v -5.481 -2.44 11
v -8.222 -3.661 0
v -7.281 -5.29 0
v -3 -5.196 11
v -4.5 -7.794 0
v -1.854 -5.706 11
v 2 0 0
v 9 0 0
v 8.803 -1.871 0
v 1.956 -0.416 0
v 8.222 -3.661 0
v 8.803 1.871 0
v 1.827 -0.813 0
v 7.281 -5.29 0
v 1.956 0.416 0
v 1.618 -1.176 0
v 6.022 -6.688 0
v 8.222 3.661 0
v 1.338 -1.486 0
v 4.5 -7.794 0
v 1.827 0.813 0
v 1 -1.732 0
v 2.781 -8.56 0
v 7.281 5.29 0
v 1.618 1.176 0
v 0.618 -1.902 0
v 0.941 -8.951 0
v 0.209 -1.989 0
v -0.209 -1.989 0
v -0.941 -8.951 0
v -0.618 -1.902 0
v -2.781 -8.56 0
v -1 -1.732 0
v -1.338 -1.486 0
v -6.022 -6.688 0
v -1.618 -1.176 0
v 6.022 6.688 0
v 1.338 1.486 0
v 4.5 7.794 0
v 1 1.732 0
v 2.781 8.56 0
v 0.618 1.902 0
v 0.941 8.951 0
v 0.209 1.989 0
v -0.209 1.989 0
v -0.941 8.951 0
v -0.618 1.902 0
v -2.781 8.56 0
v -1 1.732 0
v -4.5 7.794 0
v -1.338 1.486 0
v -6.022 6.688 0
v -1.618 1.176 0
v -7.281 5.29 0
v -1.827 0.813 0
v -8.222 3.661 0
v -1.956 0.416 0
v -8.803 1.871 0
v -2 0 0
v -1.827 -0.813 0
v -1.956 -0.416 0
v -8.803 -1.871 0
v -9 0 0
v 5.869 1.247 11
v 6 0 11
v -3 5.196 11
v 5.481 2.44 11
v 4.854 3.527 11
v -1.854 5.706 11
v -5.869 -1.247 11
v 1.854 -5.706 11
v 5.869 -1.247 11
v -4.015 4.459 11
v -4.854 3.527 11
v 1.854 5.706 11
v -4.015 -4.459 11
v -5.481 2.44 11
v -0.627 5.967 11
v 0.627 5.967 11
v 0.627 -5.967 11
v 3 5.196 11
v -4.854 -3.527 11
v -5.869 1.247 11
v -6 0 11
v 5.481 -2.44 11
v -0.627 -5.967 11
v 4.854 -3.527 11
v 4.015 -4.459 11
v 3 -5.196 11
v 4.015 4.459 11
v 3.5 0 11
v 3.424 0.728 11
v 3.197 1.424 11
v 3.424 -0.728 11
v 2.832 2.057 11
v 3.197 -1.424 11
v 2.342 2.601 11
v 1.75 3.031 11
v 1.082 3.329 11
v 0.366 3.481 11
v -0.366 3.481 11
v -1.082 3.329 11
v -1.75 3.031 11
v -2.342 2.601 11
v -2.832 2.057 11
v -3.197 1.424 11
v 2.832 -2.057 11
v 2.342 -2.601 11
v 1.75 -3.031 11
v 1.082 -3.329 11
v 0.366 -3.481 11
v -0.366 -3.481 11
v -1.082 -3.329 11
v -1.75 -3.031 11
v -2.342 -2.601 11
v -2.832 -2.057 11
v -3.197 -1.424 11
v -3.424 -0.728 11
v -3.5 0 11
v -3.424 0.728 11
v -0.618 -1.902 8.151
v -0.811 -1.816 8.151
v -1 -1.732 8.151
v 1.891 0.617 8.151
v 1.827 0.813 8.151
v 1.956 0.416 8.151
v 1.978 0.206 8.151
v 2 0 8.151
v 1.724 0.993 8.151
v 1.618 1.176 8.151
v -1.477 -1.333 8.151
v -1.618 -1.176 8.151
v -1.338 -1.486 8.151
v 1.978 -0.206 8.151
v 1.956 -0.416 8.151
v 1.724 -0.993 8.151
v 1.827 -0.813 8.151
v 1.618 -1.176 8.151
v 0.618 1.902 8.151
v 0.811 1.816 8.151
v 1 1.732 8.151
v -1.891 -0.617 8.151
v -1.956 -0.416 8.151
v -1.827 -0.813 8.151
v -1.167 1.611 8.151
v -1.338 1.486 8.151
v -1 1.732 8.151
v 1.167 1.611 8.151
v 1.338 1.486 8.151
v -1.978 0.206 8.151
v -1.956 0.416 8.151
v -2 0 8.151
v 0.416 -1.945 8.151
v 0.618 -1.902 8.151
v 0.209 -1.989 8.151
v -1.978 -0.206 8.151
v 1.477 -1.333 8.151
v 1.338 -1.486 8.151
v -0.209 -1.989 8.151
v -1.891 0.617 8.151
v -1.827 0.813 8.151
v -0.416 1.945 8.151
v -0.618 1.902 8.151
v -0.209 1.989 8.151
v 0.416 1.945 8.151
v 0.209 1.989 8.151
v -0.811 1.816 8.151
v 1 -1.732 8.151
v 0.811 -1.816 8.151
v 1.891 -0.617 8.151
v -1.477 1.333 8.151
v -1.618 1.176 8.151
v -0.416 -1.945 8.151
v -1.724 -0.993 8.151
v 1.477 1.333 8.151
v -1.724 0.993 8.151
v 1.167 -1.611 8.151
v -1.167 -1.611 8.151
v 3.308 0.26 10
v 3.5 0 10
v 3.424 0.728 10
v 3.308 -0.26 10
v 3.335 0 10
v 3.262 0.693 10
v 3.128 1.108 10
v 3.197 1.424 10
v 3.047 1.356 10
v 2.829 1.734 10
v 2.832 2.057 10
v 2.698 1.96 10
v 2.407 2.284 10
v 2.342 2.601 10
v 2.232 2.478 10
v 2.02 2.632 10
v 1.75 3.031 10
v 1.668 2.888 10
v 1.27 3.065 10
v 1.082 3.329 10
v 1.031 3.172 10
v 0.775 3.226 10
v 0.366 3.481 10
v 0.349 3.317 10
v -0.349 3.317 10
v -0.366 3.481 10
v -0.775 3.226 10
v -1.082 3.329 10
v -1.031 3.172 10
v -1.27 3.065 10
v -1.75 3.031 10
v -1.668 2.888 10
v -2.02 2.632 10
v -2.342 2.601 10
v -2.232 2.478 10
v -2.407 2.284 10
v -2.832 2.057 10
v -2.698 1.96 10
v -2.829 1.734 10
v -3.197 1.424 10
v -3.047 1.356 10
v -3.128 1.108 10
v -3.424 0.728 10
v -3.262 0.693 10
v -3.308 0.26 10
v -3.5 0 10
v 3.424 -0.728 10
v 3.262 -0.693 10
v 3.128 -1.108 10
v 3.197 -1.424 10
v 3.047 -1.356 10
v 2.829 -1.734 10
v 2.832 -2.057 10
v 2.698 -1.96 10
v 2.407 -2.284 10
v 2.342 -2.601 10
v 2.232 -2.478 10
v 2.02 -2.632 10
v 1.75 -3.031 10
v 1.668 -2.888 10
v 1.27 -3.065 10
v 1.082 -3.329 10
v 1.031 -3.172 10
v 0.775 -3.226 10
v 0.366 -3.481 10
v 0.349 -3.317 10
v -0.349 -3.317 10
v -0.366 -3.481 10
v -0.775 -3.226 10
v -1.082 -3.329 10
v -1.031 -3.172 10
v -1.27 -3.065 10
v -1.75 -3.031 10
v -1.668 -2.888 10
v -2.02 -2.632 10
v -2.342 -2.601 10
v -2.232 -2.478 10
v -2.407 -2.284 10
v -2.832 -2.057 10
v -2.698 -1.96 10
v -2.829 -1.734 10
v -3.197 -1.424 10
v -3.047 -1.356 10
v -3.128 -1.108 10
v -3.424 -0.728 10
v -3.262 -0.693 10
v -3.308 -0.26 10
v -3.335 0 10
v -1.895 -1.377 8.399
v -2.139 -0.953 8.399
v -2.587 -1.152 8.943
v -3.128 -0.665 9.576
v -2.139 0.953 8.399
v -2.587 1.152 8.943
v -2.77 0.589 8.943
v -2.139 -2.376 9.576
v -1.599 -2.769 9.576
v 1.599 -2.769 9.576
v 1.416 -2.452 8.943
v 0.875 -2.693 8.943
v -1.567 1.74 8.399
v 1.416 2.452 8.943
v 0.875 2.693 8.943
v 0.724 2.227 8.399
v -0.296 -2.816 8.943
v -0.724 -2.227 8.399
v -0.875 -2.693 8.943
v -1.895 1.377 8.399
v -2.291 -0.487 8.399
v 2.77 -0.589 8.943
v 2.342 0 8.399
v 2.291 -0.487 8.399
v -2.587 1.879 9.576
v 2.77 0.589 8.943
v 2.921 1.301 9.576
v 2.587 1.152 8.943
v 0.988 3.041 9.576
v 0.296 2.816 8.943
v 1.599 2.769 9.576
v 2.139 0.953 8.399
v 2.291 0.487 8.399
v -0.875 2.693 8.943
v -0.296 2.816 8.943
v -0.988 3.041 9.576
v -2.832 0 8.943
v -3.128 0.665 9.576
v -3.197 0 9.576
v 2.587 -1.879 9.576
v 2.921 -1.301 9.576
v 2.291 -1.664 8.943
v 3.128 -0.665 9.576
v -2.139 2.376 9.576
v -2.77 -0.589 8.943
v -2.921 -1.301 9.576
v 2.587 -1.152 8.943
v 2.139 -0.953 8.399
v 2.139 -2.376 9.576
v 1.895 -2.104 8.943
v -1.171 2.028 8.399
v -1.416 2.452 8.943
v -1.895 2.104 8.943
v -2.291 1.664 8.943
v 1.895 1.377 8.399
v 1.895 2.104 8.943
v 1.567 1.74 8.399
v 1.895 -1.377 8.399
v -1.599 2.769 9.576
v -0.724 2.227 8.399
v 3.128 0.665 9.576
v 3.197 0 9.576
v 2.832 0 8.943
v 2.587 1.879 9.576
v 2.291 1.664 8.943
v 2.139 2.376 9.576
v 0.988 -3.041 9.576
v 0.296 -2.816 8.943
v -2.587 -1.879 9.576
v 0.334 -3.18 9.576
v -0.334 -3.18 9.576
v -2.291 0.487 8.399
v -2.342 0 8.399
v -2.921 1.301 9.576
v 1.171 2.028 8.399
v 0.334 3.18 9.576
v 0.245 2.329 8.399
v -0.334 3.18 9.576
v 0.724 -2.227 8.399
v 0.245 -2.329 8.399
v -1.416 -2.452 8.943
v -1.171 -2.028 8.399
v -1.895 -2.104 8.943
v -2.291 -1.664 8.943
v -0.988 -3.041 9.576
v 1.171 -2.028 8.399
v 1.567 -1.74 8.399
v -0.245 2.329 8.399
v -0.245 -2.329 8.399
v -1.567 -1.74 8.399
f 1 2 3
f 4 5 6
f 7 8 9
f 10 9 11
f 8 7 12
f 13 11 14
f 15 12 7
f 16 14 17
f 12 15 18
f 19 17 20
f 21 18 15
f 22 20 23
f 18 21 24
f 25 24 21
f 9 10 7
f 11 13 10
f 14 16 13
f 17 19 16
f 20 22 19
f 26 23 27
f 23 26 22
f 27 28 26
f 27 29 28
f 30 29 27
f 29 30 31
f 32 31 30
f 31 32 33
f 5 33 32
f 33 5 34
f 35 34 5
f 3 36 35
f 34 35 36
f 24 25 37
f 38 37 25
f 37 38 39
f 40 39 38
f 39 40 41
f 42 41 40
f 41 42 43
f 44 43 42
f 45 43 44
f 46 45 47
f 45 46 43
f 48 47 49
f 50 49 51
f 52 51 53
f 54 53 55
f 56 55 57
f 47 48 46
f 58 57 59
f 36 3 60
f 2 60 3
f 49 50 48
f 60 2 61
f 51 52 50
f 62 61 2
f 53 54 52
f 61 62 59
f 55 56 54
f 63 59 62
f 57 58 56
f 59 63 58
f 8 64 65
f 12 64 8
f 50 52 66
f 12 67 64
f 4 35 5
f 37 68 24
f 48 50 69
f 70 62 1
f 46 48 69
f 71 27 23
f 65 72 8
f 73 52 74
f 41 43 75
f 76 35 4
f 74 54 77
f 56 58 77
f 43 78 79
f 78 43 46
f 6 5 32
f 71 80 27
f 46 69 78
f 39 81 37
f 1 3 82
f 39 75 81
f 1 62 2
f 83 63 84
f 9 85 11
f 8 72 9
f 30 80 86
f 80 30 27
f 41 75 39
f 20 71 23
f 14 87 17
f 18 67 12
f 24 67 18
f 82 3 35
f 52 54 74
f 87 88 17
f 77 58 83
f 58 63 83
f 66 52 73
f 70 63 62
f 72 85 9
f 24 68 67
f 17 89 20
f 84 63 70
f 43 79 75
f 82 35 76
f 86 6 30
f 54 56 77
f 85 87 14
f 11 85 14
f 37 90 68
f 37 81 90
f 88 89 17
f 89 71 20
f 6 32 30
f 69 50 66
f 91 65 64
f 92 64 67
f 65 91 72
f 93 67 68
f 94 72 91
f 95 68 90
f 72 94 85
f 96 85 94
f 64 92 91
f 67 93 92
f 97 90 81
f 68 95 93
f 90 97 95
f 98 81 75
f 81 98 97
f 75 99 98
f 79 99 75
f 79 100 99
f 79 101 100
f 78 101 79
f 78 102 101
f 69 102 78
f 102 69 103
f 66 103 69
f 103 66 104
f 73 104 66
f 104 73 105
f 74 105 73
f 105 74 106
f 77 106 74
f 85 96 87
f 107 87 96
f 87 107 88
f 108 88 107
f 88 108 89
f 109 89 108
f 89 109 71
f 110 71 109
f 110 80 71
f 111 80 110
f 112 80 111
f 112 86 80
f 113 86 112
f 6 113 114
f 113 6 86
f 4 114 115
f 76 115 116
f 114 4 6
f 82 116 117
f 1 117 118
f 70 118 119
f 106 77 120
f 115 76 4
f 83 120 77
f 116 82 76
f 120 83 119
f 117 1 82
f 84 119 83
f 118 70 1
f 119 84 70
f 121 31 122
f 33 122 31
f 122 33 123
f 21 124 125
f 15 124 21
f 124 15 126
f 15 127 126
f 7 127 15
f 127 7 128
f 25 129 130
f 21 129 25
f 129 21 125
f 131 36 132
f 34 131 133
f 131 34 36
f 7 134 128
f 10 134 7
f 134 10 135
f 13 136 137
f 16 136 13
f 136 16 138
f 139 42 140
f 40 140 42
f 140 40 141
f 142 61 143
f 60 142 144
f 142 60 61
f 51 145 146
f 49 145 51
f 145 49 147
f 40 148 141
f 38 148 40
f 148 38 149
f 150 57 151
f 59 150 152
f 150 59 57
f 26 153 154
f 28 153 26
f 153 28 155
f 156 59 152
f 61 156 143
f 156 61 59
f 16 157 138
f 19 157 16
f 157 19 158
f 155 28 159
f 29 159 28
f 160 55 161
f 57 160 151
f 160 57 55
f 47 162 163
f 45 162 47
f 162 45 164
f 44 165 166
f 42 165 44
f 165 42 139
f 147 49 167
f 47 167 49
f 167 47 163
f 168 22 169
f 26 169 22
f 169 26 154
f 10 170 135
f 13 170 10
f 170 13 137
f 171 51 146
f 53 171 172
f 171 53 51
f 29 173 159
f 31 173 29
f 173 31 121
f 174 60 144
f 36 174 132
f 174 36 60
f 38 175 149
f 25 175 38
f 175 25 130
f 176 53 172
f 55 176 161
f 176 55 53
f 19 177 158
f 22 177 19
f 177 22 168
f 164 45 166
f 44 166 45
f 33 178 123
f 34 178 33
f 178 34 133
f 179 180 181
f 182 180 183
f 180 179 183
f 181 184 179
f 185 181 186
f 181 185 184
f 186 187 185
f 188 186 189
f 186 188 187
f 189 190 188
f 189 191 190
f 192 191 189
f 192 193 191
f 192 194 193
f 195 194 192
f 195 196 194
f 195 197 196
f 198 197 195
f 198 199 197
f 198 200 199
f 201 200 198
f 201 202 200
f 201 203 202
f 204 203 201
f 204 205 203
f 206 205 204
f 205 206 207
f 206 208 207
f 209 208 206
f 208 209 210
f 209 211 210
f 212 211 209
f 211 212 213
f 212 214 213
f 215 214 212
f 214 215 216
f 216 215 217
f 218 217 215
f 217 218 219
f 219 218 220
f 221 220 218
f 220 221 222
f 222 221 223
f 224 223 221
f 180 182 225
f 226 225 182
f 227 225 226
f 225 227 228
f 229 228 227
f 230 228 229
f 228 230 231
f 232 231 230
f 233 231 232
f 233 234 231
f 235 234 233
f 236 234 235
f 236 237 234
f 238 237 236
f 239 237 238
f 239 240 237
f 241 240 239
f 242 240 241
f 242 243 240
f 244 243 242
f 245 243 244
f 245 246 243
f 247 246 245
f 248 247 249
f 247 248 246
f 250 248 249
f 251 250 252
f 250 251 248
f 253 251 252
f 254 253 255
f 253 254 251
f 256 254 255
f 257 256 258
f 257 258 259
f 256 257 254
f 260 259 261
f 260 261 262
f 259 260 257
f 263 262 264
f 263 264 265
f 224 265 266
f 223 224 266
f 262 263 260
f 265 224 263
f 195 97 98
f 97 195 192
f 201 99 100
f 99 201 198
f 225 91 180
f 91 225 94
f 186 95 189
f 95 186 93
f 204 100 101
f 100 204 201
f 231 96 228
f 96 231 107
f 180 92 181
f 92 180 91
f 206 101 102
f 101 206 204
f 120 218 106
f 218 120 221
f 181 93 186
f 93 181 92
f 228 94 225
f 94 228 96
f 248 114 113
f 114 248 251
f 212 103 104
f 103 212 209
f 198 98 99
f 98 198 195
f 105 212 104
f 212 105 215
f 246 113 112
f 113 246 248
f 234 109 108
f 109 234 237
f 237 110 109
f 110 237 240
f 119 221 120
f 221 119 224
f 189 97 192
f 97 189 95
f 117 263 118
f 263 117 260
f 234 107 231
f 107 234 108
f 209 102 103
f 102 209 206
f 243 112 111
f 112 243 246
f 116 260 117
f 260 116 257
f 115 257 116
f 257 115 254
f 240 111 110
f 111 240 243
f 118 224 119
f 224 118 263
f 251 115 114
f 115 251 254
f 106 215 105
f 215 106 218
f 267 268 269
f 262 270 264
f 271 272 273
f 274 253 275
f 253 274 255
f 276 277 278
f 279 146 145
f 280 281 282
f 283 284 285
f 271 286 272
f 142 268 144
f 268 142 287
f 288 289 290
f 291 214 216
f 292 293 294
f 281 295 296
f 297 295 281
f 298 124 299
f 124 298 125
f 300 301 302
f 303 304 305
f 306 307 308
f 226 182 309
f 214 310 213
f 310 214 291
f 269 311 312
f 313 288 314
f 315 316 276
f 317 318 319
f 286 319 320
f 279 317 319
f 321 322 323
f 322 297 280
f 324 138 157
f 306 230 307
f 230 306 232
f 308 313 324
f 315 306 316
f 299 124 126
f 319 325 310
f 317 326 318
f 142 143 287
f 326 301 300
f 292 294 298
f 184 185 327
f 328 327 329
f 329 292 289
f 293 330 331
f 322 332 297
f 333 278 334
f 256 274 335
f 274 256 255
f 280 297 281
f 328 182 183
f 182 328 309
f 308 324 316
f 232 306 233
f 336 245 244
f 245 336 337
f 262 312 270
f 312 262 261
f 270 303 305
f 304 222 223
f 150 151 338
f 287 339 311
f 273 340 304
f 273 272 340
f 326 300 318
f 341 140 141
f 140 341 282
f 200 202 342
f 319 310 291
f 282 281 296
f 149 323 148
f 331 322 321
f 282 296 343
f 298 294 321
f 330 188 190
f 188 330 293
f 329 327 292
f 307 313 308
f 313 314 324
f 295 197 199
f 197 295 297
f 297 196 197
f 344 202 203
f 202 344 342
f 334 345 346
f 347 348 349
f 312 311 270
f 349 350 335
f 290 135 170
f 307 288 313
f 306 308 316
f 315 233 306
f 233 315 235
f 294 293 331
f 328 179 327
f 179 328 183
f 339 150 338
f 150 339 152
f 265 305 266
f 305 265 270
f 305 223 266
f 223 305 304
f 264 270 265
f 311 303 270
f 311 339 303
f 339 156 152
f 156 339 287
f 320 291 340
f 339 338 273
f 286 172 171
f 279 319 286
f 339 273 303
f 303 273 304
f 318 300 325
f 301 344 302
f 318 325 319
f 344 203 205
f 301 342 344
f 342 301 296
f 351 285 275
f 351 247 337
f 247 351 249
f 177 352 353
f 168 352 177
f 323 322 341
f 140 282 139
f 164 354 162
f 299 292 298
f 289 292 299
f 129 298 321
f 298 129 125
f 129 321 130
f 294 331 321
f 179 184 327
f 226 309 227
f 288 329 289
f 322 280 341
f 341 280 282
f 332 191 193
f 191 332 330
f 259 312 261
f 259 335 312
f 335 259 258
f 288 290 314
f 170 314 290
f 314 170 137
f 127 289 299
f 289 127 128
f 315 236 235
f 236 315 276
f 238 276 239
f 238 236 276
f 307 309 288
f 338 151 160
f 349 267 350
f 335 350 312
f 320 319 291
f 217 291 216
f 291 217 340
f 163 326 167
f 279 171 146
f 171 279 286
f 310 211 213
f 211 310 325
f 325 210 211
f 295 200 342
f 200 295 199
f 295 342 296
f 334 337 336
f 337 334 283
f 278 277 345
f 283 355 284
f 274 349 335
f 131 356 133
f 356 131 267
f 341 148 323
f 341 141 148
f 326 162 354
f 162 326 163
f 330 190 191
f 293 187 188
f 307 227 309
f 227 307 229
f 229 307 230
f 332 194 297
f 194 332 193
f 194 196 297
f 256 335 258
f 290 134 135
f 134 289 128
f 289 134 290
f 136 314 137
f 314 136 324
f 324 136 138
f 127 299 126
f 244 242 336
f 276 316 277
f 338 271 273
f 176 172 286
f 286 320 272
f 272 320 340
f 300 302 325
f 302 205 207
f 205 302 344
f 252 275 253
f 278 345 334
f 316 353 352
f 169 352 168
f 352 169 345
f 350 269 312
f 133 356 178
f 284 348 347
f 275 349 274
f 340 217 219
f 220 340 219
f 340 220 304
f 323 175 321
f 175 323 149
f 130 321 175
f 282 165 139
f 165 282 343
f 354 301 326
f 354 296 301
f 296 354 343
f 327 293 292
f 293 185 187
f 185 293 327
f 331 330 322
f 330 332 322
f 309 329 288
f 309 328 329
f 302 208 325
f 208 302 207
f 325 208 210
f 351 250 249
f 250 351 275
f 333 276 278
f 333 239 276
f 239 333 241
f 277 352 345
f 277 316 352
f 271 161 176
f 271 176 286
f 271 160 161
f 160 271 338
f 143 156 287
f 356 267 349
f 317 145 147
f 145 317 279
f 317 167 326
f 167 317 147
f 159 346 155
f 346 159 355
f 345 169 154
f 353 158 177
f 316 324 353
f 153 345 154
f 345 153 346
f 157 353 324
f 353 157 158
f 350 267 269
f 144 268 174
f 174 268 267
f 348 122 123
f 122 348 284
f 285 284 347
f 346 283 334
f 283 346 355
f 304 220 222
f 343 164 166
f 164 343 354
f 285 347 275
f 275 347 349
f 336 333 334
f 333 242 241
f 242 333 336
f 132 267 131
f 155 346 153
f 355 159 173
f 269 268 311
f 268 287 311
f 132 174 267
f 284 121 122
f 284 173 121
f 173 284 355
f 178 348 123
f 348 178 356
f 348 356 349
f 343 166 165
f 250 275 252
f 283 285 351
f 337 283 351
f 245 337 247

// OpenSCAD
$fn = 30;

difference() {
    cylinder(h = 11, d1 = 18, d2 = 12);
    cylinder(h = 11, d = 4);
    translate([0, 0, 10]) cylinder(h = 4, d = 7);
    translate([0, 0, 11]) sphere(d = 7);
}
